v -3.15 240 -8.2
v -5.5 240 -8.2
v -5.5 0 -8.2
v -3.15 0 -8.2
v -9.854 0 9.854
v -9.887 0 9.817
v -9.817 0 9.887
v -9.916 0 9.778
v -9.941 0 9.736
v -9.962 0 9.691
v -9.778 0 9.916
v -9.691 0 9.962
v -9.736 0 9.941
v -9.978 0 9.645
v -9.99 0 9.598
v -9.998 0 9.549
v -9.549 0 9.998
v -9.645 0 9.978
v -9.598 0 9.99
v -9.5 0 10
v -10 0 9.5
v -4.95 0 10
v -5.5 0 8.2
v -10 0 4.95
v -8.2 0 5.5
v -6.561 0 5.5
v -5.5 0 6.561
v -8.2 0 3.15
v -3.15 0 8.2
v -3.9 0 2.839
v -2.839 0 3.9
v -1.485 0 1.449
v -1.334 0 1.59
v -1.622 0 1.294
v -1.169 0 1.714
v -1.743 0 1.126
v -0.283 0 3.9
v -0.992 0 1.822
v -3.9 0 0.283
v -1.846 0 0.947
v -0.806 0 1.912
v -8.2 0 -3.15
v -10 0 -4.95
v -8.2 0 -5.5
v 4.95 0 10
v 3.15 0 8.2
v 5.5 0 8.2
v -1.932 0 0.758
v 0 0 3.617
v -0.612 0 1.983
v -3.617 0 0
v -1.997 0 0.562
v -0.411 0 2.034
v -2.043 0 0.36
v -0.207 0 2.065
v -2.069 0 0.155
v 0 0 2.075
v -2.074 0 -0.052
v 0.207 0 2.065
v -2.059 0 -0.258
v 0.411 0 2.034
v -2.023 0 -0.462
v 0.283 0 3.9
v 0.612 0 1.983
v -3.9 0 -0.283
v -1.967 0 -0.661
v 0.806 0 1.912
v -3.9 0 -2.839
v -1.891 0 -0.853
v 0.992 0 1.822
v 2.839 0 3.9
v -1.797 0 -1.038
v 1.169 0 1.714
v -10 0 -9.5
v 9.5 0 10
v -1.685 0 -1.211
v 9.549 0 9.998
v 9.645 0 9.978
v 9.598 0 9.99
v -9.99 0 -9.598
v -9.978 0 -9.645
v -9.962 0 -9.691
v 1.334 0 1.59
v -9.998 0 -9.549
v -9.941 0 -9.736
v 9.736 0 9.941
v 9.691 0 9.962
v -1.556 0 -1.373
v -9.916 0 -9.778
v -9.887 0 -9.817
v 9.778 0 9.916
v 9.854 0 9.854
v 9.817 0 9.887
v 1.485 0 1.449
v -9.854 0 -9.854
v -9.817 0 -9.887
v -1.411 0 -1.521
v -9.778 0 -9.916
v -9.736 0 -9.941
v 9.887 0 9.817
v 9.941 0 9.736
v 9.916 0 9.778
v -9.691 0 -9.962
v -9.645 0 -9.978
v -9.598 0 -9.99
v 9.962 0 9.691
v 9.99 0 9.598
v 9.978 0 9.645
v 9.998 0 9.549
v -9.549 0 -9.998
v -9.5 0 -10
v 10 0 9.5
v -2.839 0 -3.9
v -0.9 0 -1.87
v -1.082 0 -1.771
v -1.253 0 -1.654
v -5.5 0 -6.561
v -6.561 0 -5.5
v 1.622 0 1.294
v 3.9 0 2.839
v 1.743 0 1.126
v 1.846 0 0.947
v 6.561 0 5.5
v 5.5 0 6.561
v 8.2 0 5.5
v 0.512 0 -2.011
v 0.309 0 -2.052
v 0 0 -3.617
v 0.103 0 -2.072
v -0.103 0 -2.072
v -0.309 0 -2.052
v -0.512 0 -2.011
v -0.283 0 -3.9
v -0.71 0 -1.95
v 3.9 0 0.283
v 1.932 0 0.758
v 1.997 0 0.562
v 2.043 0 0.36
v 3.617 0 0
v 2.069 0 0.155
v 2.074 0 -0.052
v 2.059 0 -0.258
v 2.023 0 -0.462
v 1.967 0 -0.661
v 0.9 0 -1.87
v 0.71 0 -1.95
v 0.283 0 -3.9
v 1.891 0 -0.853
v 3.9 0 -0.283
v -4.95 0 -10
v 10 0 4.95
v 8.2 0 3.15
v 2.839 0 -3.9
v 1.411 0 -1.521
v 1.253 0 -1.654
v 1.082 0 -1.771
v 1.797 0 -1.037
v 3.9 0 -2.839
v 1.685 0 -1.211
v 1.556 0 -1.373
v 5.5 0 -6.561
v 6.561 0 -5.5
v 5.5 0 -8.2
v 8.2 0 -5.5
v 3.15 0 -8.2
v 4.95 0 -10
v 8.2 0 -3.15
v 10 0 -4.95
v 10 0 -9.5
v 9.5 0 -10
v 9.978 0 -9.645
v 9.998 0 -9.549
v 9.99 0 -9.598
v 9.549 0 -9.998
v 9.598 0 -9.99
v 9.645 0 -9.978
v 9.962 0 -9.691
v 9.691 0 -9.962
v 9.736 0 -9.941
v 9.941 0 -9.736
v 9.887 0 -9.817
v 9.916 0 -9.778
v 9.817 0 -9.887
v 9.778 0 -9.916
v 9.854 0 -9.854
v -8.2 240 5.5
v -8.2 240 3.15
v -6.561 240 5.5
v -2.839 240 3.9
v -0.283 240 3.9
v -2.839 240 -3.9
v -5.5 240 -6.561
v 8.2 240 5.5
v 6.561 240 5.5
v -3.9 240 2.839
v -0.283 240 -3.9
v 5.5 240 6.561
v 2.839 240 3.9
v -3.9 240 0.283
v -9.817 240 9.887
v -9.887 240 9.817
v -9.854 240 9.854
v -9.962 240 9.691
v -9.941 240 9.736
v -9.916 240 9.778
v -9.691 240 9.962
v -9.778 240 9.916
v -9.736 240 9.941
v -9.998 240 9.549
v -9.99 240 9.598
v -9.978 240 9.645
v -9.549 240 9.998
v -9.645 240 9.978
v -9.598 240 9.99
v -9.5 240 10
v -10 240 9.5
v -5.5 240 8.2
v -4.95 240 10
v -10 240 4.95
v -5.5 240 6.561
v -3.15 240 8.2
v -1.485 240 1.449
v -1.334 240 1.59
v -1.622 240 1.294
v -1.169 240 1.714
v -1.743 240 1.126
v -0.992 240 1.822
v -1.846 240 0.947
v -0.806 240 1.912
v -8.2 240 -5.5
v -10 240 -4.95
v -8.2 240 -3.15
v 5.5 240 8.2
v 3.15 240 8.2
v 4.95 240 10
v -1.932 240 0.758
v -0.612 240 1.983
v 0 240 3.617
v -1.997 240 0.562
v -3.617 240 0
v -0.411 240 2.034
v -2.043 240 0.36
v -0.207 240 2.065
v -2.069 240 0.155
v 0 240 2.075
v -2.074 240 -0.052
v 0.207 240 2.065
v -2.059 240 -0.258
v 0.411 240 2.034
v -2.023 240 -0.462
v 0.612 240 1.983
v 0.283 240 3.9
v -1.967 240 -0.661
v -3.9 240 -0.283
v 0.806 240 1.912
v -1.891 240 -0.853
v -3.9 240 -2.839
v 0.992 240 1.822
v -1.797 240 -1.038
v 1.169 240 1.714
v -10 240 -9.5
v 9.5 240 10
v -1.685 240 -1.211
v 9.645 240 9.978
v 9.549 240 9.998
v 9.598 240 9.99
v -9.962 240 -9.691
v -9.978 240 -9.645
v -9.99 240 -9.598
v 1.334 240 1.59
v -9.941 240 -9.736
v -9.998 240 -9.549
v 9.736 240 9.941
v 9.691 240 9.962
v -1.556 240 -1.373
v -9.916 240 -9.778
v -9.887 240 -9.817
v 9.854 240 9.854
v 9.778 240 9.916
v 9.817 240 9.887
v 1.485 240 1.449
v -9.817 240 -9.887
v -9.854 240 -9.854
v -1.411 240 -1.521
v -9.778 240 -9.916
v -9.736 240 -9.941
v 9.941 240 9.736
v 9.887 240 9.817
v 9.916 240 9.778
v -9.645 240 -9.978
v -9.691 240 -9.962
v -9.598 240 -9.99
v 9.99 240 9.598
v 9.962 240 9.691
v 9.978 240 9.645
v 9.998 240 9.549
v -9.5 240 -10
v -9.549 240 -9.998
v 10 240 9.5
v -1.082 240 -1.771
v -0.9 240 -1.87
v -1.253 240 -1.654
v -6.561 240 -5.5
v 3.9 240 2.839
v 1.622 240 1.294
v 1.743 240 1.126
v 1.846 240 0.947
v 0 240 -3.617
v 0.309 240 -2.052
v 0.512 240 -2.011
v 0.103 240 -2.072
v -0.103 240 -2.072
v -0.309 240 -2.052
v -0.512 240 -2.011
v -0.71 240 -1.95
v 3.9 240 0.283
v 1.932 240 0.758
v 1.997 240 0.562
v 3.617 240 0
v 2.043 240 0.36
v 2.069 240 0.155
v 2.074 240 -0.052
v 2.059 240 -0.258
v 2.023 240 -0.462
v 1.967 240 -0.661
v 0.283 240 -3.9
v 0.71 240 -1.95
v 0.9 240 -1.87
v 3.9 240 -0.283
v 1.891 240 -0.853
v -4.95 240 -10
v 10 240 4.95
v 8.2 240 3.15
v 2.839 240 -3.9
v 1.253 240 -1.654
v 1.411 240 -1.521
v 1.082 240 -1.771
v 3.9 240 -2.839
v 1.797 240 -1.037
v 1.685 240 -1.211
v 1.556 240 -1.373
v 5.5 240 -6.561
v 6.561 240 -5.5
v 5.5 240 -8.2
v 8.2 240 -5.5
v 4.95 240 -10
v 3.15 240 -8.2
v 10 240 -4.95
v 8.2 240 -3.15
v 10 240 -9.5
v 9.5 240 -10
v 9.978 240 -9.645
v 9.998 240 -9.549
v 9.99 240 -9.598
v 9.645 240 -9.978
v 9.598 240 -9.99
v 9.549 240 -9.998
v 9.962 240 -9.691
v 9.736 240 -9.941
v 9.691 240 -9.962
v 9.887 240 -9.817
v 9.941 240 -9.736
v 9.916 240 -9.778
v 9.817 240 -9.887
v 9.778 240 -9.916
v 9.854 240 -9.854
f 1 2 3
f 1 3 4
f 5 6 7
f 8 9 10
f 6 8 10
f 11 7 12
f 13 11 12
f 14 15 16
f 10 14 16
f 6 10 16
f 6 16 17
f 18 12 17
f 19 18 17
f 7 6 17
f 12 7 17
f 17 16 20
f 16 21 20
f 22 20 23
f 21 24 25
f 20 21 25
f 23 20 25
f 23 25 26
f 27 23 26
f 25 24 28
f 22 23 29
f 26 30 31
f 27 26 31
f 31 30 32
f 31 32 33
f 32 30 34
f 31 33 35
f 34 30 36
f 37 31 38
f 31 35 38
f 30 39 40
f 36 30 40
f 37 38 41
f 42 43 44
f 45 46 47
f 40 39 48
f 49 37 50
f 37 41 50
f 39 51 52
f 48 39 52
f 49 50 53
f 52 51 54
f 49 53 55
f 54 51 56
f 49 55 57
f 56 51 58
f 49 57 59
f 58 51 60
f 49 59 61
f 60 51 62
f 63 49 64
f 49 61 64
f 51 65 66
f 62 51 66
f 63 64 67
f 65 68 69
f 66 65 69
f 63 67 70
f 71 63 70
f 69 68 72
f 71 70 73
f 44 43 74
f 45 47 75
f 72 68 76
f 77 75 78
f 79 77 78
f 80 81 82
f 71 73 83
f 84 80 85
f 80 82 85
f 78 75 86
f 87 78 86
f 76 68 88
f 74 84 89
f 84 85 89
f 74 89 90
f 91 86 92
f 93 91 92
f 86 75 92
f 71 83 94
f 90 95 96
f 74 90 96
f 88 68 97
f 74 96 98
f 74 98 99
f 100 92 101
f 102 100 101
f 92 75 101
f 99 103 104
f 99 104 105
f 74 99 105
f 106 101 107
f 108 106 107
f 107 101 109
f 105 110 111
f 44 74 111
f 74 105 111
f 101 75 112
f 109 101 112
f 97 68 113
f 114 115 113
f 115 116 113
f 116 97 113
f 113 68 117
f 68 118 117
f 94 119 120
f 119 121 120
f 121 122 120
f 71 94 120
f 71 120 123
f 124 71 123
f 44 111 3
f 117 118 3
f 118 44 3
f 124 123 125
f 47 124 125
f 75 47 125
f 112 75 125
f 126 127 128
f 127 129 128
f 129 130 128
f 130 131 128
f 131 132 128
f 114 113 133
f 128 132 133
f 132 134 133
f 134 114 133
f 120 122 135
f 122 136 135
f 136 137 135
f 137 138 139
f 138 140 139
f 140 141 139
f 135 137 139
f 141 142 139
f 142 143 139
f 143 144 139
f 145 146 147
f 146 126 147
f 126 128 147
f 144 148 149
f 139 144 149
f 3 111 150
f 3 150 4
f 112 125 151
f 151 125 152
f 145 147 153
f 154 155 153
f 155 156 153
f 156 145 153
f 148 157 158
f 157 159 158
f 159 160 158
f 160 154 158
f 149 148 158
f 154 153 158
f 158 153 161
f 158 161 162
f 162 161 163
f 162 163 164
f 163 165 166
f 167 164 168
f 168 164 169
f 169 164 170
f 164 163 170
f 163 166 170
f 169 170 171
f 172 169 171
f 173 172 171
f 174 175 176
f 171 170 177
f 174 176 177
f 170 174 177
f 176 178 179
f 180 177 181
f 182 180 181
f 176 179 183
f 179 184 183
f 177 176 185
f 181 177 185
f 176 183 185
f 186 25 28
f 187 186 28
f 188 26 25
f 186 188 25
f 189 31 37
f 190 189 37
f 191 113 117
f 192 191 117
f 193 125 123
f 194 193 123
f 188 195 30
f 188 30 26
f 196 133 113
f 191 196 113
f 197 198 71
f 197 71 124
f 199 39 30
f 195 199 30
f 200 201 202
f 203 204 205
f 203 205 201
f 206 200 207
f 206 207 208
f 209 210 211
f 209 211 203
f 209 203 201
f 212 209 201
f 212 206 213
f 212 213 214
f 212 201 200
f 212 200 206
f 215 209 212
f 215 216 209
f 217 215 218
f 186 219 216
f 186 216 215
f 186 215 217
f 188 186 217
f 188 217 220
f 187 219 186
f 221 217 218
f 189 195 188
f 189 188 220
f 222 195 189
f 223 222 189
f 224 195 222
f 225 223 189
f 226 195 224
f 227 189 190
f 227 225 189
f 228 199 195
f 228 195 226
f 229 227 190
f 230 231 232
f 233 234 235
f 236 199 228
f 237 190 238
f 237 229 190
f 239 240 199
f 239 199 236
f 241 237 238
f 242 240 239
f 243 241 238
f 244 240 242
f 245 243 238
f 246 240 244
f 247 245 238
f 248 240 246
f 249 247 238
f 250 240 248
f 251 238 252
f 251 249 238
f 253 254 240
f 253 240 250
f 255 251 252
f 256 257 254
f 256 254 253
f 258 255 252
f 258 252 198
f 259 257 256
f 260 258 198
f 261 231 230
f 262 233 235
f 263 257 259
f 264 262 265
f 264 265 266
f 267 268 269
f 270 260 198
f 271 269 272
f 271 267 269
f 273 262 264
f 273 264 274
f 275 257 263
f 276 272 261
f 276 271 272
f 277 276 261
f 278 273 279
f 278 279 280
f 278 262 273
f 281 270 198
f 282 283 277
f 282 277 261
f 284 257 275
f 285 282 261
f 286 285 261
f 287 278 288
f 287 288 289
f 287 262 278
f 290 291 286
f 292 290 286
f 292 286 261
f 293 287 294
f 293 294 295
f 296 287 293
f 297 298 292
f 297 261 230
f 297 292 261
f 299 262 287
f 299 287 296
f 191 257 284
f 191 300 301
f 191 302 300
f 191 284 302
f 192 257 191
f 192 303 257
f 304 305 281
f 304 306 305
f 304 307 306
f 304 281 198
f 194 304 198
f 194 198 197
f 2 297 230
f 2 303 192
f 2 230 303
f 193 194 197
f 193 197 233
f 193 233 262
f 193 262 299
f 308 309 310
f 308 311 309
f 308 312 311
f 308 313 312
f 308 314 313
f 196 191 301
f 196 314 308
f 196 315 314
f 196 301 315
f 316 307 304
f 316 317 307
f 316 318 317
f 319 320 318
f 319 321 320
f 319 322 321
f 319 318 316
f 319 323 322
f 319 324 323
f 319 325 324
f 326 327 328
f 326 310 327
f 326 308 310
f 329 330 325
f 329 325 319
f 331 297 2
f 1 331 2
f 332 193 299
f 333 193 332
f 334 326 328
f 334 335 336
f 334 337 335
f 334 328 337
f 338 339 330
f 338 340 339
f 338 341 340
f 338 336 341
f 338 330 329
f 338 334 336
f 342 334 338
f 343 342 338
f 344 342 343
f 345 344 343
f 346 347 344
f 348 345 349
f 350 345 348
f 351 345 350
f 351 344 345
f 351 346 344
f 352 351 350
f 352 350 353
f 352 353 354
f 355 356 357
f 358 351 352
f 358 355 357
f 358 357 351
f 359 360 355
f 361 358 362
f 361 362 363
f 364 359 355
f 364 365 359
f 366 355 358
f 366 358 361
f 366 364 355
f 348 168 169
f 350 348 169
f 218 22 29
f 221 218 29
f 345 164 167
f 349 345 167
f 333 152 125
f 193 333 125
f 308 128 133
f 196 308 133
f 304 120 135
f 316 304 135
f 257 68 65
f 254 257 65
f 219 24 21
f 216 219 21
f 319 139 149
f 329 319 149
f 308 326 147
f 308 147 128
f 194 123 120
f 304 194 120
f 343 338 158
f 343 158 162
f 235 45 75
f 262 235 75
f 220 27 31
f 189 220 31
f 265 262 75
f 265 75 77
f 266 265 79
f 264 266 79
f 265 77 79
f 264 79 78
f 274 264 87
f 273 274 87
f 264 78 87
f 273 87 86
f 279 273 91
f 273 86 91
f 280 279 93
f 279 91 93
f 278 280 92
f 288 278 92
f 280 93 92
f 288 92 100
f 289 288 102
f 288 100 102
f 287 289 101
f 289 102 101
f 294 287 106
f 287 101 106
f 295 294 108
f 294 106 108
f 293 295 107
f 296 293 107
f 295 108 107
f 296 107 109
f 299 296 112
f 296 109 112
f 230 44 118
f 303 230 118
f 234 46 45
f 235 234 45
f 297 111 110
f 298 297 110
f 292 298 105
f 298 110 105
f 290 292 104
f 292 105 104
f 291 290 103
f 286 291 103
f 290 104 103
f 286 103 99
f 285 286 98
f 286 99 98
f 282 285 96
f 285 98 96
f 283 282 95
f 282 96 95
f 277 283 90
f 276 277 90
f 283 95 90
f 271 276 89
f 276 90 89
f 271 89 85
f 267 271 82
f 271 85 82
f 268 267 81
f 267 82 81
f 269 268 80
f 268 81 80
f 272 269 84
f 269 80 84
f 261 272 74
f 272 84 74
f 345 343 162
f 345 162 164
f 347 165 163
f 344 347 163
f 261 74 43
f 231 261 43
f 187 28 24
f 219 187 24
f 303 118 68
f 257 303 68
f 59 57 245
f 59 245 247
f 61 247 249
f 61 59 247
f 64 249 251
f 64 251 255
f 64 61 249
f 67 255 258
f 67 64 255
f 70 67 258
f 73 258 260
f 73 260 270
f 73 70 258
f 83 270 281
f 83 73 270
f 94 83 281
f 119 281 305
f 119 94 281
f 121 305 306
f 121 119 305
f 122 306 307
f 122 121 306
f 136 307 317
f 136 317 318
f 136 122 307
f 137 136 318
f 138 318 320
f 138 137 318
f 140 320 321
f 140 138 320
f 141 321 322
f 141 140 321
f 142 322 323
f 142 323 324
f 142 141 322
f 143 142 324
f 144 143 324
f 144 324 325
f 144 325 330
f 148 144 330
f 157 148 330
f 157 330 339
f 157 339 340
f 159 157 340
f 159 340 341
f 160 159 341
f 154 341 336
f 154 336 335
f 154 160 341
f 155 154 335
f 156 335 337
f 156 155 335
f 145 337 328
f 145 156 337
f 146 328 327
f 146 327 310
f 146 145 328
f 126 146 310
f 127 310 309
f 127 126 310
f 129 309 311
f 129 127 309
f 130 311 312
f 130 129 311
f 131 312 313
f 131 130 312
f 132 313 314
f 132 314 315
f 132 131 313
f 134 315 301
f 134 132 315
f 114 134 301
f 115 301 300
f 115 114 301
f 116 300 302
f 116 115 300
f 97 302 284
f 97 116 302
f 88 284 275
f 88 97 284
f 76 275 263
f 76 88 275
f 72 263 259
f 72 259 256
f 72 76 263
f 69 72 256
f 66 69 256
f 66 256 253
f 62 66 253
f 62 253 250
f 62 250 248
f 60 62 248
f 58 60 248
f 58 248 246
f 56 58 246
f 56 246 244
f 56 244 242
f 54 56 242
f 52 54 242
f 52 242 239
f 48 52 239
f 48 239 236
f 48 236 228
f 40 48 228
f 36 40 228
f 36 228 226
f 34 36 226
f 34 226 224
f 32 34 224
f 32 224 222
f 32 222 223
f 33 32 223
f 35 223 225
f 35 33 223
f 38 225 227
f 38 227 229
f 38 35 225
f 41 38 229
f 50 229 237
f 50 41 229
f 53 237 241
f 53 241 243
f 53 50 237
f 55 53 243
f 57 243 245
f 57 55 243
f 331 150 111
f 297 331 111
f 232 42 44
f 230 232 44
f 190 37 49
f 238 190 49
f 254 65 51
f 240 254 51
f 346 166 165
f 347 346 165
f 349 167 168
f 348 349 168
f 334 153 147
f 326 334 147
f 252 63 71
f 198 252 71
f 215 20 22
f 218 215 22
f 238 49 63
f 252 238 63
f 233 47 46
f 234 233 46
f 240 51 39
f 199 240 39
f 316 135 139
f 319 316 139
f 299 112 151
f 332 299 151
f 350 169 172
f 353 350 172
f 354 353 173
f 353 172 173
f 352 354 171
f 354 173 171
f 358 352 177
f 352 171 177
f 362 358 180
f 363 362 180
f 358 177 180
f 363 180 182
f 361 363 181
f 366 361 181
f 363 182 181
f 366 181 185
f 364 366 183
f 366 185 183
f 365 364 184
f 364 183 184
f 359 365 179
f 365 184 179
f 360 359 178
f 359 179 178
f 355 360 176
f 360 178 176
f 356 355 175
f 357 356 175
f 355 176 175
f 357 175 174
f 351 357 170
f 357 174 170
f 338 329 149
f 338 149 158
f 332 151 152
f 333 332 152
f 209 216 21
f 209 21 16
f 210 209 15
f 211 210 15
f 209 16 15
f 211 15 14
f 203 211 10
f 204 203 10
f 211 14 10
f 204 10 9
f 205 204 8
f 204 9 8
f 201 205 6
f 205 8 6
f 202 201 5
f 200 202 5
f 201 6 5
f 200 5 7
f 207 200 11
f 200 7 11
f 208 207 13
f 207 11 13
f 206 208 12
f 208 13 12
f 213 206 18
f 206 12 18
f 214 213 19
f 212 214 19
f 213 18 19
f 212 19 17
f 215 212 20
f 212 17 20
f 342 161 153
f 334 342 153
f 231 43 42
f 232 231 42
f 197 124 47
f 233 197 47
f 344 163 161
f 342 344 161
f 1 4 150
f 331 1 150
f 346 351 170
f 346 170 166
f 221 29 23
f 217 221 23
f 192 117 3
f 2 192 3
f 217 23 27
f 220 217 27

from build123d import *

# Parameters (mm, degrees)
SKETCH_28_R         = 2.075
EXTRUDE_2020V_DEPTH = 240


with BuildPart() as part:
    # 草图28 → 2020V (new body)
    with BuildSketch(Plane(origin=(0, 0, 0), x_dir=(1, 0, 0), z_dir=(0, 1, 0))):
        with BuildLine():
            Line((-3.900000395, 2.839340223), (-3.900000395, 0.282843107))
            Line((-3.900000395, 0.282843107), (-3.617157288, 0))
            Line((-3.617157288, 0), (-3.9, -0.282842712))
            Line((-3.9, -0.282842712), (-3.9, -2.839339828))
            Line((-3.9, -2.839339828), (-6.560660172, -5.5))
            Line((-6.560660172, -5.5), (-8.2, -5.5))
            Line((-8.2, -5.5), (-8.2, -3.150000255))
            Line((-8.2, -3.150000255), (-10, -4.950000255))
            Line((-10, -4.950000255), (-10, -9.5))
            ThreePointArc((-10, -9.5), (-9.853553391, -9.853553391), (-9.5, -10))
            Line((-9.5, -10), (-4.950000255, -10))
            Line((-4.950000255, -10), (-3.150000255, -8.2))
            Line((-3.150000255, -8.2), (-5.5, -8.2))
            Line((-5.5, -8.2), (-5.5, -6.560660172))
            Line((-5.5, -6.560660172), (-2.839339828, -3.9))
            Line((-2.839339828, -3.9), (-0.282842712, -3.9))
            Line((-0.282842712, -3.9), (0, -3.617157288))
            Line((0, -3.617157288), (0.282842712, -3.9))
            Line((0.282842712, -3.9), (2.839339828, -3.9))
            Line((2.839339828, -3.9), (5.5, -6.560660172))
            Line((5.5, -6.560660172), (5.5, -8.2))
            Line((5.5, -8.2), (3.150000255, -8.2))
            Line((3.150000255, -8.2), (4.950000255, -10))
            Line((4.950000255, -10), (9.5, -10))
            ThreePointArc((9.5, -10), (9.853553391, -9.853553391), (10, -9.5))
            Line((10, -9.5), (10, -4.950000255))
            Line((10, -4.950000255), (8.2, -3.150000255))
            Line((8.2, -3.150000255), (8.2, -5.5))
            Line((8.2, -5.5), (6.560660172, -5.5))
            Line((6.560660172, -5.5), (3.9, -2.839339828))
            Line((3.9, -2.839339828), (3.9, -0.282842712))
            Line((3.9, -0.282842712), (3.617157288, 0))
            Line((3.617157288, 0), (3.900000116, 0.282842829))
            Line((3.900000116, 0.282842829), (3.900000116, 2.839339944))
            Line((3.900000116, 2.839339944), (6.560660288, 5.500000116))
            Line((6.560660288, 5.500000116), (8.200000116, 5.500000116))
            Line((8.200000116, 5.500000116), (8.200000116, 3.150000371))
            Line((8.200000116, 3.150000371), (10.000000116, 4.950000371))
            Line((10.000000116, 4.950000371), (10.000000116, 9.499999884))
            ThreePointArc((10.000000116, 9.499999884), (9.853553507, 9.853553275), (9.500000116, 9.999999884))
            Line((9.500000116, 9.999999884), (4.950000139, 9.999999884))
            Line((4.950000139, 9.999999884), (3.150000139, 8.199999884))
            Line((3.150000139, 8.199999884), (5.499999884, 8.199999884))
            Line((5.499999884, 8.199999884), (5.499999884, 6.560660056))
            Line((5.499999884, 6.560660056), (2.839339712, 3.899999884))
            Line((2.839339712, 3.899999884), (0.282842991, 3.899999884))
            Line((0.282842991, 3.899999884), (0, 3.617156893))
            Line((0, 3.617156893), (-0.282842712, 3.899999605))
            Line((-0.282842712, 3.899999605), (-2.839339434, 3.899999605))
            Line((-2.839339434, 3.899999605), (-5.499999605, 6.560659777))
            Line((-5.499999605, 6.560659777), (-5.499999605, 8.199999605))
            Line((-5.499999605, 8.199999605), (-3.149999861, 8.199999605))
            Line((-3.149999861, 8.199999605), (-4.949999861, 9.999999605))
            Line((-4.949999861, 9.999999605), (-9.500000395, 9.999999605))
            ThreePointArc((-9.500000395, 9.999999605), (-9.853553785, 9.853552996), (-10.000000395, 9.499999605))
            Line((-10.000000395, 9.499999605), (-10.000000395, 4.95000065))
            Line((-10.000000395, 4.95000065), (-8.200000395, 3.15000065))
            Line((-8.200000395, 3.15000065), (-8.200000395, 5.500000395))
            Line((-8.200000395, 5.500000395), (-6.560660566, 5.500000395))
            Line((-6.560660566, 5.500000395), (-3.900000395, 2.839340223))
        make_face()
        with Locations(Location((0, 0, 0), (0, 0, 270))):
            Circle(SKETCH_28_R, mode=Mode.SUBTRACT)
    extrude(amount=EXTRUDE_2020V_DEPTH)


solid = part.part
